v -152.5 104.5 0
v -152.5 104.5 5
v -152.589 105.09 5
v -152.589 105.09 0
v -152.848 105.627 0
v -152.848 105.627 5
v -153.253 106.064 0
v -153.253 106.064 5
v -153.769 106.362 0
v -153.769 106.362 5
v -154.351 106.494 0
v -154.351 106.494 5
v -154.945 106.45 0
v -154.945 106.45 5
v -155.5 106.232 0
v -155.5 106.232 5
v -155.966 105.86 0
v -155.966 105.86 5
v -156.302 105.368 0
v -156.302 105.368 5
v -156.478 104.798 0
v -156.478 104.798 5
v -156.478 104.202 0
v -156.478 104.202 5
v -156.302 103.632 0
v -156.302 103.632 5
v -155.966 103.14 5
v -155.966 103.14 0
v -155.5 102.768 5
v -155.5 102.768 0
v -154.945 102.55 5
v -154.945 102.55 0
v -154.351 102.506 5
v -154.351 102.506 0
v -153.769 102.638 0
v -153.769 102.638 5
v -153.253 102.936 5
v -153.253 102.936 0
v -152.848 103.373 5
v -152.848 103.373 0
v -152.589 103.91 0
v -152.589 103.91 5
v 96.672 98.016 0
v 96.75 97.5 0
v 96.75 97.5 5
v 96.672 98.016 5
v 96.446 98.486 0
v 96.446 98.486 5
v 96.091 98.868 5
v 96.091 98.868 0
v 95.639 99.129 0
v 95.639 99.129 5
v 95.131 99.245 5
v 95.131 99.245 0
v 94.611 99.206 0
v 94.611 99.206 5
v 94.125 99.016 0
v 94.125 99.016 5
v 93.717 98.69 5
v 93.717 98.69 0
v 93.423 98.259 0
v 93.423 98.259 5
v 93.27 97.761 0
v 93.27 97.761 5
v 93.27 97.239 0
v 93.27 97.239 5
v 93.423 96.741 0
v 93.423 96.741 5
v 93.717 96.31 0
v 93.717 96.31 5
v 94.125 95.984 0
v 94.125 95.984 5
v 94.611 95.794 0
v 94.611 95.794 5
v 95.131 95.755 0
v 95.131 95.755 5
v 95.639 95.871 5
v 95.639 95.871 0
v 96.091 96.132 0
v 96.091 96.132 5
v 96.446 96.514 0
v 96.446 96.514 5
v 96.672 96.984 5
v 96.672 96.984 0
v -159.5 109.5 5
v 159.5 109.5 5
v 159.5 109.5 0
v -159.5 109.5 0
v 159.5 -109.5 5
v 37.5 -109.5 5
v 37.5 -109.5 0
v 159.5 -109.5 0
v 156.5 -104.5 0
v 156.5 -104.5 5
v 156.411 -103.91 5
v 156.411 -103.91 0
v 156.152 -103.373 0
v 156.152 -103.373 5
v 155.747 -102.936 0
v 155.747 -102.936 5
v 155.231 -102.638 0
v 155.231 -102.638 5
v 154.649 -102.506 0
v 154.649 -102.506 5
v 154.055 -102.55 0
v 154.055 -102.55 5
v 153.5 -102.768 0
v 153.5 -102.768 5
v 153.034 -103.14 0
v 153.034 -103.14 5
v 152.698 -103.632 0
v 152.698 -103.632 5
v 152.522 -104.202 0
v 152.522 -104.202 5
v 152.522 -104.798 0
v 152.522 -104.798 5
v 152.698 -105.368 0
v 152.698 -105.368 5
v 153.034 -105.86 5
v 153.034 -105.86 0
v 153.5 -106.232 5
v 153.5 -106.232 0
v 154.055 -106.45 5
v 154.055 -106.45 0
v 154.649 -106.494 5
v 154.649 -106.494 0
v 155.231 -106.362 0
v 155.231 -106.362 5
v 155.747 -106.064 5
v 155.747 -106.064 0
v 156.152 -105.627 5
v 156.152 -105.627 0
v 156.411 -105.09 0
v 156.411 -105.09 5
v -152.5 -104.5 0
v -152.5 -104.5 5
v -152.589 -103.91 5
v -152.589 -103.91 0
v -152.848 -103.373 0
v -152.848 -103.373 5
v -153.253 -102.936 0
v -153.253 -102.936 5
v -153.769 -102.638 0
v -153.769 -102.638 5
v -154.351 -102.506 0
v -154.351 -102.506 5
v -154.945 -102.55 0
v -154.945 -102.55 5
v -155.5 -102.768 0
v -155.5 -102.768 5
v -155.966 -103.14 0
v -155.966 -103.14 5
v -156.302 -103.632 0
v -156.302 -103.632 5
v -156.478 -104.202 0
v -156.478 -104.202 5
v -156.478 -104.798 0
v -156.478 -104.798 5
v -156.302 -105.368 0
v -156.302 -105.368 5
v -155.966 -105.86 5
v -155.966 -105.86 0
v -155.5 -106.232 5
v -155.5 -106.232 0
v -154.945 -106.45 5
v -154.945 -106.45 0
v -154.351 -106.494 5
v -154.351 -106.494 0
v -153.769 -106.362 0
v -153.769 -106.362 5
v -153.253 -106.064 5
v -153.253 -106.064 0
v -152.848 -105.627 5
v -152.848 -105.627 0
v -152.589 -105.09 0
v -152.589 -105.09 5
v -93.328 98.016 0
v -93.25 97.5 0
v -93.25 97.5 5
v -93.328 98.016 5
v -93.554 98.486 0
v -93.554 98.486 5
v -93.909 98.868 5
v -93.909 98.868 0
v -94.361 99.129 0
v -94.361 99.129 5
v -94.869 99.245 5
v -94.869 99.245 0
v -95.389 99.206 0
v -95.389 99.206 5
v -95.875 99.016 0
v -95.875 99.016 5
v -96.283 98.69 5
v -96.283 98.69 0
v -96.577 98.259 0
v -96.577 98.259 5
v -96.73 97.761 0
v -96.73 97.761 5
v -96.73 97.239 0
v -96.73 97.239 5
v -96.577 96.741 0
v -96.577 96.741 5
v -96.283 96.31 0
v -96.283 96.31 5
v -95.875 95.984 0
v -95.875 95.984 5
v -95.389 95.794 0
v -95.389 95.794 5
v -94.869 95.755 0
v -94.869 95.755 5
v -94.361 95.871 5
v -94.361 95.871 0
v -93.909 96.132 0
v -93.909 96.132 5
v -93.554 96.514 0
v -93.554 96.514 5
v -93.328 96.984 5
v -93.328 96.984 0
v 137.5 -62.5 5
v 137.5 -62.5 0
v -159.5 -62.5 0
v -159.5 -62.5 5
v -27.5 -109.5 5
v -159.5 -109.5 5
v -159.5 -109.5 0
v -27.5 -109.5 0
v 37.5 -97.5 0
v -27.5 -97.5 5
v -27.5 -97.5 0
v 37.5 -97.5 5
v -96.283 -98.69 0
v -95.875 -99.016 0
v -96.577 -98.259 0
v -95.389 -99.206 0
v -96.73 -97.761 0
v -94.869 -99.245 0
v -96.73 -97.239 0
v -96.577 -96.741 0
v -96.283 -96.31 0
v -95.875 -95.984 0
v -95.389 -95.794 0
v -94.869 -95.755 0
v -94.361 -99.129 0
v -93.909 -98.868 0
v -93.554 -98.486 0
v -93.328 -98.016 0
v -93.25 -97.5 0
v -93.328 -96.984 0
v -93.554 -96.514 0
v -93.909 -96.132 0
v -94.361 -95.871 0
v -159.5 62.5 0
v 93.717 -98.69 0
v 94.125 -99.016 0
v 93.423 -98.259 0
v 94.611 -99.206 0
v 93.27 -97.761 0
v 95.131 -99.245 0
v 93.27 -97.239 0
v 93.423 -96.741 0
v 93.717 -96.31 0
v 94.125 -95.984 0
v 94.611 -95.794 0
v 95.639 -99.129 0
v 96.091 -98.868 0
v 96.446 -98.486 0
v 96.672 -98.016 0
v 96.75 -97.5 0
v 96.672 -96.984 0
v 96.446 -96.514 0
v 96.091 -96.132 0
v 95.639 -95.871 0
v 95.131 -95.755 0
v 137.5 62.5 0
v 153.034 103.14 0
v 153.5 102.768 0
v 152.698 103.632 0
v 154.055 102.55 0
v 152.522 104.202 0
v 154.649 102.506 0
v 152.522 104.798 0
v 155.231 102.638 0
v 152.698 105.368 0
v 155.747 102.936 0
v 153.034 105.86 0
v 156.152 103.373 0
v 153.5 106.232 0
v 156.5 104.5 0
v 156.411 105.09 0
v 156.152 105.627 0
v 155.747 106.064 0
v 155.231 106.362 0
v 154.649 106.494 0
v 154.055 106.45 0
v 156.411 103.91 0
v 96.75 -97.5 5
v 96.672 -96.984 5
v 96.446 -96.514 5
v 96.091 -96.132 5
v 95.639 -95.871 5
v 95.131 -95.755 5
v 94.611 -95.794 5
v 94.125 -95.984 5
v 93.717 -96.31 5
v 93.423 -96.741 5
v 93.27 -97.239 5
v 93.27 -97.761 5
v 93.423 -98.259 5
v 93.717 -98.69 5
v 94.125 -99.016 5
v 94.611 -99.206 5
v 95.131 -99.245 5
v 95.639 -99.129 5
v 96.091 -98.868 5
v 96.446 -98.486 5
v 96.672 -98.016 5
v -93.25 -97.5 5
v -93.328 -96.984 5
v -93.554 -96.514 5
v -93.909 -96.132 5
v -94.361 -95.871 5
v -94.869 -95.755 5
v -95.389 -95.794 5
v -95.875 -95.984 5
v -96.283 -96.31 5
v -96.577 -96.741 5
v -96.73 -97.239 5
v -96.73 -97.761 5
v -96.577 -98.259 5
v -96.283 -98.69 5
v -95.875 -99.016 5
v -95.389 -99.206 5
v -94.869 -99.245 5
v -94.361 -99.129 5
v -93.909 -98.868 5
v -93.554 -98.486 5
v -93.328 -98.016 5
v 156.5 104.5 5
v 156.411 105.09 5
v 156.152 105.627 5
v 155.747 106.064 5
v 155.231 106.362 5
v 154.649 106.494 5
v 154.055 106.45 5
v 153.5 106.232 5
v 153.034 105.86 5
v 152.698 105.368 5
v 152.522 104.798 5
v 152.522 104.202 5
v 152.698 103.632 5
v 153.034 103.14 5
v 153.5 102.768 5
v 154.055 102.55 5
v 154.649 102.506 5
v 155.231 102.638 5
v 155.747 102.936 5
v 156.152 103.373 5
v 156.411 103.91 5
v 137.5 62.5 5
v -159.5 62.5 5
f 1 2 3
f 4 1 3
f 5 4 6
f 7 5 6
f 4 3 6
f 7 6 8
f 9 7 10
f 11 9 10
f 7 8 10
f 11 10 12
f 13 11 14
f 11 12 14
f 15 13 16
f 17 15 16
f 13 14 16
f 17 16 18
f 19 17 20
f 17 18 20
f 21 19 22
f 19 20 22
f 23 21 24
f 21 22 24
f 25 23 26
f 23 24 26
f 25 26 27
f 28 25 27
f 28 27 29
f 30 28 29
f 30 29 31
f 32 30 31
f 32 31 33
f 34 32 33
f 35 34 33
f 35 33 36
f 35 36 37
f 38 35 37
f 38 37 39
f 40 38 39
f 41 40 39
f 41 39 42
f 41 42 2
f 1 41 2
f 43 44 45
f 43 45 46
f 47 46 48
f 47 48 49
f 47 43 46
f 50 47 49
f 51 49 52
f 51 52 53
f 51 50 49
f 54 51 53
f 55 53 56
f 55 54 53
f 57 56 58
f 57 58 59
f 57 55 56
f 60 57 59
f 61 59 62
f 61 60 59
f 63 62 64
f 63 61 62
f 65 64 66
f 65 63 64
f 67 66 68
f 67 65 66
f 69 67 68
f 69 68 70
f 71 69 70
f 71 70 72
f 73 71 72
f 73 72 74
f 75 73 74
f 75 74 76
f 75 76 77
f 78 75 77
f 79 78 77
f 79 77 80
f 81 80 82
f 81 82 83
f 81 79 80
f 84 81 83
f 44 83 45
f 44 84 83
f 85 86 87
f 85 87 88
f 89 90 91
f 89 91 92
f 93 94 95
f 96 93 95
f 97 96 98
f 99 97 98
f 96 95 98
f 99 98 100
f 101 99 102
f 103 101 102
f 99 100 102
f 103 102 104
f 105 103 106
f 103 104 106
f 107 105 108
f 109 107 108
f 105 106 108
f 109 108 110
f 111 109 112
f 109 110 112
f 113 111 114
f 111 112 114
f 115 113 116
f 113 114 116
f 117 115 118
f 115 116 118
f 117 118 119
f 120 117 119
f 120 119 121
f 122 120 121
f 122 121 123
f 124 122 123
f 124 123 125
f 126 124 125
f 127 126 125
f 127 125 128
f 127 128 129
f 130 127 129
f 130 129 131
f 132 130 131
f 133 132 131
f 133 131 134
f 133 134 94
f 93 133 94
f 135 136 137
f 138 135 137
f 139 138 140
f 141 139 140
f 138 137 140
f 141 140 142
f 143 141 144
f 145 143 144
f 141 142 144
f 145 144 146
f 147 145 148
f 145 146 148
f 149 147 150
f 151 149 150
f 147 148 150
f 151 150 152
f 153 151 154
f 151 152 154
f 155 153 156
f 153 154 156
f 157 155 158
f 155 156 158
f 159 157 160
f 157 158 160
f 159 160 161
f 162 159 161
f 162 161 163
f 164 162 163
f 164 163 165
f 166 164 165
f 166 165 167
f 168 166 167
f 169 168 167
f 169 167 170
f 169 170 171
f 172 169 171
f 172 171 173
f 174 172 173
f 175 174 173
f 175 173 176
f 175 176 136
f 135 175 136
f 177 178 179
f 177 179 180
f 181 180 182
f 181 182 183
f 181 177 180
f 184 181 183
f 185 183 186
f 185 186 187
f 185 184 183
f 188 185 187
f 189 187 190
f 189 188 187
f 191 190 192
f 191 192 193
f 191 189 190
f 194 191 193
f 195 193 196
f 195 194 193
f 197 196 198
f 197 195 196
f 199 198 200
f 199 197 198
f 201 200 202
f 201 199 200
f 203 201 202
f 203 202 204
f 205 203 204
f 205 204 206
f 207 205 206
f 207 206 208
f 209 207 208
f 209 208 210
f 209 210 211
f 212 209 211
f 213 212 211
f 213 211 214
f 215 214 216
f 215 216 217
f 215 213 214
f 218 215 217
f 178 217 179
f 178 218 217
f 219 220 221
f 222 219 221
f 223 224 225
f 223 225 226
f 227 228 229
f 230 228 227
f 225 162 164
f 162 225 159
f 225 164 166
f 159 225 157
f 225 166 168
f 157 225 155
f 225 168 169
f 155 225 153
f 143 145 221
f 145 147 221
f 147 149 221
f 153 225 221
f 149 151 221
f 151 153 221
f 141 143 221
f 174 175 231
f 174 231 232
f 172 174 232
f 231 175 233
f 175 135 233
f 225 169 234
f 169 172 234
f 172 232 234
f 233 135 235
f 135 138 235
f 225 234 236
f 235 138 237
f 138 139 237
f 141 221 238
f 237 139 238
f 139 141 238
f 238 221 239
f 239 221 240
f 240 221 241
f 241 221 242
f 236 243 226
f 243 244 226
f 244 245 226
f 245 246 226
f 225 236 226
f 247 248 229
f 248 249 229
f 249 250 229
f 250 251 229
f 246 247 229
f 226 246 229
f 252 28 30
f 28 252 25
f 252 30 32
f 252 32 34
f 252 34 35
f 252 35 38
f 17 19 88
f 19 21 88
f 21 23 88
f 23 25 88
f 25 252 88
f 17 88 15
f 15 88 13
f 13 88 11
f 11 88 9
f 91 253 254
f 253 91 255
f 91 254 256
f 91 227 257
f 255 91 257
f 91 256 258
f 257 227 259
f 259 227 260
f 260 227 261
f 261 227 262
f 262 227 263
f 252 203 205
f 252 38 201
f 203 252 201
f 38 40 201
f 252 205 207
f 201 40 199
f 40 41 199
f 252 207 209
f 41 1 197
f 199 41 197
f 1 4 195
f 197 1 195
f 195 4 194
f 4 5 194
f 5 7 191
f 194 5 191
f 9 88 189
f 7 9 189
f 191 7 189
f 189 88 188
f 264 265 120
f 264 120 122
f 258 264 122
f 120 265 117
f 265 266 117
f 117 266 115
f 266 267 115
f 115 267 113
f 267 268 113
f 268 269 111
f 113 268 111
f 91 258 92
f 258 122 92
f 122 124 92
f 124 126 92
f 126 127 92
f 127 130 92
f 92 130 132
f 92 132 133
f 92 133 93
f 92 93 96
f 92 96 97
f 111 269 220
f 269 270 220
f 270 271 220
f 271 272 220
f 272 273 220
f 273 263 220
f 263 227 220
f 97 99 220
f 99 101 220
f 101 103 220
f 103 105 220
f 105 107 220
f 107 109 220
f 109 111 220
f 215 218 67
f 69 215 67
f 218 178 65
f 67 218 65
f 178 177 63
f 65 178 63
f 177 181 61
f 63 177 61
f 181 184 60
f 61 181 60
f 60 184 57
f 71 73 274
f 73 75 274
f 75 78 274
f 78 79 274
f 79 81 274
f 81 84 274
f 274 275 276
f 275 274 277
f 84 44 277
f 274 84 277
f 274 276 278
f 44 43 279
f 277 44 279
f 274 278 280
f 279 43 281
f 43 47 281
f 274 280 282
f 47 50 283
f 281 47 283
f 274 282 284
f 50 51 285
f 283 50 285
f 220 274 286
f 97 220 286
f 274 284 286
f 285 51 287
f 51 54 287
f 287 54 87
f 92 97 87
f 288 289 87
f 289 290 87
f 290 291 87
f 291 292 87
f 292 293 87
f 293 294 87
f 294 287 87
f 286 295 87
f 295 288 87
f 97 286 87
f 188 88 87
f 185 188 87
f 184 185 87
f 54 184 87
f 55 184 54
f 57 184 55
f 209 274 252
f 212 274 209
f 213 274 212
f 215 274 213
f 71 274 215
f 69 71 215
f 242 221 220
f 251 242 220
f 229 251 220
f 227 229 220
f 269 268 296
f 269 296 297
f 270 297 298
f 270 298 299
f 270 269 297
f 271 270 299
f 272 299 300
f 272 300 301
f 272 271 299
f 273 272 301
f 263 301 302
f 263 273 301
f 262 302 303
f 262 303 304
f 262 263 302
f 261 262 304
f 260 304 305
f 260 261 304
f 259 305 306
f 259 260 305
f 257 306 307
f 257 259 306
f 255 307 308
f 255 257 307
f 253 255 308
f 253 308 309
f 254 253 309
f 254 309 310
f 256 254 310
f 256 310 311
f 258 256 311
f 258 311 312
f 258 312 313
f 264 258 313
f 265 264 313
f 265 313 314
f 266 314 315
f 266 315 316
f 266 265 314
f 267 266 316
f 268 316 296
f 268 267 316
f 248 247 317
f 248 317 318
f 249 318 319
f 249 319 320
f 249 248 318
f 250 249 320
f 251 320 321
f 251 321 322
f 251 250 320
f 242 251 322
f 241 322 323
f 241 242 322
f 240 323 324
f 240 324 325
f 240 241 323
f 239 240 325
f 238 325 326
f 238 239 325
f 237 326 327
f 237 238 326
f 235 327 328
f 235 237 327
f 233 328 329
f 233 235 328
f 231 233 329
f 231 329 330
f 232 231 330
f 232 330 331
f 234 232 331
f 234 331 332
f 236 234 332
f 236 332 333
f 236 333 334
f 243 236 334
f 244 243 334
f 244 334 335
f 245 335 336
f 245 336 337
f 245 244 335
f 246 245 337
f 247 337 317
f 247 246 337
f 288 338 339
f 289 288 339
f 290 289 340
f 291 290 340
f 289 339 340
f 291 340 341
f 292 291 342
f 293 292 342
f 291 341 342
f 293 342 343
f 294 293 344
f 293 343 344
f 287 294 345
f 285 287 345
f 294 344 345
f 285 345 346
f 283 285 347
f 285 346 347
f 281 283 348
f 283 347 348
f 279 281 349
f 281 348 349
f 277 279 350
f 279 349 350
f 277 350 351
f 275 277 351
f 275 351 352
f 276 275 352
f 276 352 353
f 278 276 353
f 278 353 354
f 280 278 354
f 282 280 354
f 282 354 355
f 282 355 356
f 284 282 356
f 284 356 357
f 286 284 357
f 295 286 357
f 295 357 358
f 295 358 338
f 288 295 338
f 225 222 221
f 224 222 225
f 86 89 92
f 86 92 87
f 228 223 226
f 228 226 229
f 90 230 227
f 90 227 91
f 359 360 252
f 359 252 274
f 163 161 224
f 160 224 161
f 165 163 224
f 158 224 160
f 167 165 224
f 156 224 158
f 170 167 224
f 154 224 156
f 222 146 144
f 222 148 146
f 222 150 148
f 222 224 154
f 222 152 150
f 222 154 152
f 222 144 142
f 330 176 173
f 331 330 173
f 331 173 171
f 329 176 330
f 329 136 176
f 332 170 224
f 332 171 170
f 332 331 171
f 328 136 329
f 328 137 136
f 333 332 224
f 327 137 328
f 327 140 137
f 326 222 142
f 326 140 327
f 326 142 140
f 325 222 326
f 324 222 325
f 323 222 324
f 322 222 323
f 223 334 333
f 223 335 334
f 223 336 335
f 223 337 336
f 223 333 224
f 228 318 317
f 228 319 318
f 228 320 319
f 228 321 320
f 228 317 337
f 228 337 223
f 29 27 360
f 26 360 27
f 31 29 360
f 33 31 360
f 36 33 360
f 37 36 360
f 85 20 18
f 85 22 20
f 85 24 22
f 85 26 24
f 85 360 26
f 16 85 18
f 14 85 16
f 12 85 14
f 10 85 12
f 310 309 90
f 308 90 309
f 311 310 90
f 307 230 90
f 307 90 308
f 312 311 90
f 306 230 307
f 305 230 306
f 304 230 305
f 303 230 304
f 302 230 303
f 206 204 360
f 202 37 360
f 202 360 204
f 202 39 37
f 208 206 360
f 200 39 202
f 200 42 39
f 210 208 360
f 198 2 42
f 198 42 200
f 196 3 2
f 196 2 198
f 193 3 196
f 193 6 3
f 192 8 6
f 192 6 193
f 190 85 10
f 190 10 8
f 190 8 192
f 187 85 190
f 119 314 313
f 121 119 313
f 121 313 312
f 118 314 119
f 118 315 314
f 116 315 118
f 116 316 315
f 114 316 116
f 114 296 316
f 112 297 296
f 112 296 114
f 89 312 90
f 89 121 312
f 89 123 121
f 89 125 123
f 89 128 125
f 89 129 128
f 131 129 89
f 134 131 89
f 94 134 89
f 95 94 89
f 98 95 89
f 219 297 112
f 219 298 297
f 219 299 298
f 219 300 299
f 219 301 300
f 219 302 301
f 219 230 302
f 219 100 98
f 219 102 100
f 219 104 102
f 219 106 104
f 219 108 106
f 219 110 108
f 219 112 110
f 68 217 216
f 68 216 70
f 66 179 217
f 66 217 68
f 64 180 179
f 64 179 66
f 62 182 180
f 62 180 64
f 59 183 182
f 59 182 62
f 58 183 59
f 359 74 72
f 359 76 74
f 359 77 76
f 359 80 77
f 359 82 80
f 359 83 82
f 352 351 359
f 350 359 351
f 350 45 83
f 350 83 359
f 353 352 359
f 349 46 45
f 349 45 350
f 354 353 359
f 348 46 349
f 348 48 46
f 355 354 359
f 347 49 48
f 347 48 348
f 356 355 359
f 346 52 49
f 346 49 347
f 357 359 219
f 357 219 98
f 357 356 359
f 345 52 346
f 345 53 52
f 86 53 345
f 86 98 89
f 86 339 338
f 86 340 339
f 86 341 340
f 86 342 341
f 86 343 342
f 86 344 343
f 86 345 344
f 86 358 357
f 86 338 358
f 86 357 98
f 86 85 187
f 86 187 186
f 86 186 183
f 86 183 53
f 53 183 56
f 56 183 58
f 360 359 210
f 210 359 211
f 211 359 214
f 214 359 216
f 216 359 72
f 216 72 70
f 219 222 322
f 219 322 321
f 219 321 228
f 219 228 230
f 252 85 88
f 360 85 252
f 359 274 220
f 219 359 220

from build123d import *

# Parameters (mm, degrees)
F0_R     = 1.75
F1_DEPTH = 5
F2_R     = 2
F2_W     = 65
F2_H     = 10
F3_DEPTH = 5.001
F5_DEPTH = 5


with BuildPart() as f1:
    # F0 (on Top) → F1 (new body)
    with BuildSketch(Plane.XY):
        Polygon((157.5, 107.5), (-157.5, 107.5), (-157.5, 62.5), (137.5, 62.5), (137.5, -62.5), (-157.5, -62.5), (-157.5, -107.5), (157.5, -107.5), (157.5, -62.5), (157.5, 62.5), align=None)
        with Locations((-95, -97.5)):
            Circle(F0_R, mode=Mode.SUBTRACT)
        with Locations((95, -97.5)):
            Circle(F0_R, mode=Mode.SUBTRACT)
        with Locations((-95, 97.5)):
            Circle(F0_R, mode=Mode.SUBTRACT)
        with Locations((95, 97.5)):
            Circle(F0_R, mode=Mode.SUBTRACT)
    extrude(amount=F1_DEPTH)

    # F2 (on face) → F3 (cut, through all)
    with BuildSketch(Plane.XY.offset(5)):
        with Locations((-154.5, -104.5)):
            Circle(F2_R)
        with Locations((154.5, 274.5)):
            Circle(F2_R)
        with Locations((-59.5786754345, 247.2672616252)):
            Circle(F2_R)
        with Locations((5, -102.5)):
            Rectangle(F2_W, F2_H)
        with Locations((154.5, -104.5)):
            Circle(F2_R)
        with Locations((-154.5, 104.5)):
            Circle(F2_R)
        with Locations((154.5, 104.5)):
            Circle(F2_R)
    extrude(amount=-F3_DEPTH, mode=Mode.SUBTRACT)

    # F4 (on face) → F5 (join, through all)
    with BuildSketch(Plane.XY.offset(5)):
        Polygon((-157.5, 62.5), (-157.5, 107.5), (157.5, 107.5), (157.5, -107.5), (37.5, -107.5), (37.5, -109.5), (159.5, -109.5), (159.5, 109.5), (-159.5, 109.5), (-159.5, 62.5), align=None)
        Polygon((-27.5, -107.5), (-157.5, -107.5), (-157.5, -62.5), (-159.5, -62.5), (-159.5, -109.5), (-27.5, -109.5), align=None)
    extrude(amount=-F5_DEPTH)


solid = f1.part
